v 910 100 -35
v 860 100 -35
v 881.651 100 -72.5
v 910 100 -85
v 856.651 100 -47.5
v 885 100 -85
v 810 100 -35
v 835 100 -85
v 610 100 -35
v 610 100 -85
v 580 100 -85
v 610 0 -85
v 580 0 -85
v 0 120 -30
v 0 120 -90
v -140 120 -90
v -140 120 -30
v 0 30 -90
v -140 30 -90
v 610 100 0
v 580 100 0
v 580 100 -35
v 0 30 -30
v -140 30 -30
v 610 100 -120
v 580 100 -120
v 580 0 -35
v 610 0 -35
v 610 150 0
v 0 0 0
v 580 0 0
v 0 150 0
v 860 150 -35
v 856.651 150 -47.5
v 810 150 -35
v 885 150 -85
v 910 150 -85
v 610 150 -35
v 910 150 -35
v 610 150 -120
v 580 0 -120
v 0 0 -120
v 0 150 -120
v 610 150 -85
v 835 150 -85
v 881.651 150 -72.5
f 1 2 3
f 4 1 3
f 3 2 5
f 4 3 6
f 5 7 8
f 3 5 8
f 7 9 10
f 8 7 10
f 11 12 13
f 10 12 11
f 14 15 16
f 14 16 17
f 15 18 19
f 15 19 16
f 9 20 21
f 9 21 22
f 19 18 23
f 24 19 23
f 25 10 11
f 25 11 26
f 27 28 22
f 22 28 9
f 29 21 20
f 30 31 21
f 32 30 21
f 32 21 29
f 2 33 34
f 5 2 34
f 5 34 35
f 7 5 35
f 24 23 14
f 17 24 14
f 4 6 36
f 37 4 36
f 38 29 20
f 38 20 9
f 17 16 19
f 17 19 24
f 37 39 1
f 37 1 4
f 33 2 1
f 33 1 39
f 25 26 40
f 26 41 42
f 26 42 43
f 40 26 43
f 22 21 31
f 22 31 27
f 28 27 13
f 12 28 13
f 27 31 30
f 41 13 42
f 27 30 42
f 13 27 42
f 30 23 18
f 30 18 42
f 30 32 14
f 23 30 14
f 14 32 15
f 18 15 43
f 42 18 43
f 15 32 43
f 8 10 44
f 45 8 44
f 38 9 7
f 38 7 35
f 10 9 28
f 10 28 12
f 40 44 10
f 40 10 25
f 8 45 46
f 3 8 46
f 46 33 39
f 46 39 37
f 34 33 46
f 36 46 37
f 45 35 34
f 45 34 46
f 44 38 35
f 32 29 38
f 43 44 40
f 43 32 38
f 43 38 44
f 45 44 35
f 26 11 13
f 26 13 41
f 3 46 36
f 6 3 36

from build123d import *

# Parameters (mm, degrees)
SKETCH_1_W          = 120
SKETCH_1_H          = 150
EXTRUDE_1_DEPTH     = 610
SKETCH_2_W          = 50
SKETCH_2_H          = 50
EXTRUDE_2_DEPTH     = 300
SKETCH_3_W          = 60
SKETCH_3_H          = 90
EXTRUDE_3_DEPTH     = 140
SKETCH_4_W          = 35
SKETCH_4_H          = 100
CUT_EXTRUDE_1_DEPTH = 30
CUT_EXTRUDE_2_DEPTH = 151


with BuildPart() as part:
    # 草图1 → 凸台-拉伸1 (new body)
    with BuildSketch(Plane(origin=(0, 0, 0), x_dir=(0, 0, -1), z_dir=(1, 0, 0))):
        with Locations((60, 75)):
            Rectangle(SKETCH_1_W, SKETCH_1_H)
    extrude(amount=EXTRUDE_1_DEPTH)

    # 草图2 → 凸台-拉伸2 (add)
    with BuildSketch(Plane(origin=(610, 0, 0), x_dir=(0, 0, -1), z_dir=(1, 0, 0))):
        with Locations((60, 125)):
            Rectangle(SKETCH_2_W, SKETCH_2_H)
    extrude(amount=EXTRUDE_2_DEPTH)

    # 草图3 → 凸台-拉伸3 (add)
    with BuildSketch(Plane.ZY):
        with Locations((-60, 75)):
            Rectangle(SKETCH_3_W, SKETCH_3_H)
    extrude(amount=EXTRUDE_3_DEPTH)

    # 草图4 → 切除-拉伸1 (cut)
    with BuildSketch(Plane(origin=(610, 0, 0), x_dir=(0, 0, -1), z_dir=(1, 0, 0))):
        with Locations((17.5, 50)):
            Rectangle(SKETCH_4_W, SKETCH_4_H)
        with Locations((102.5, 50)):
            Rectangle(SKETCH_4_W, SKETCH_4_H)
    extrude(amount=-CUT_EXTRUDE_1_DEPTH, mode=Mode.SUBTRACT)

    # 草图5 → 切除-拉伸2 (cut, through all)
    with BuildSketch(Plane(origin=(0, 150, 0), x_dir=(1, 0, 0), z_dir=(0, 1, 0))):
        Polygon((810, 35), (860, 35), (856.650635095, 47.5), align=None)
        Polygon((881.650635095, 72.5), (885, 85), (835, 85), align=None)
    extrude(amount=-CUT_EXTRUDE_2_DEPTH, mode=Mode.SUBTRACT)


solid = part.part
